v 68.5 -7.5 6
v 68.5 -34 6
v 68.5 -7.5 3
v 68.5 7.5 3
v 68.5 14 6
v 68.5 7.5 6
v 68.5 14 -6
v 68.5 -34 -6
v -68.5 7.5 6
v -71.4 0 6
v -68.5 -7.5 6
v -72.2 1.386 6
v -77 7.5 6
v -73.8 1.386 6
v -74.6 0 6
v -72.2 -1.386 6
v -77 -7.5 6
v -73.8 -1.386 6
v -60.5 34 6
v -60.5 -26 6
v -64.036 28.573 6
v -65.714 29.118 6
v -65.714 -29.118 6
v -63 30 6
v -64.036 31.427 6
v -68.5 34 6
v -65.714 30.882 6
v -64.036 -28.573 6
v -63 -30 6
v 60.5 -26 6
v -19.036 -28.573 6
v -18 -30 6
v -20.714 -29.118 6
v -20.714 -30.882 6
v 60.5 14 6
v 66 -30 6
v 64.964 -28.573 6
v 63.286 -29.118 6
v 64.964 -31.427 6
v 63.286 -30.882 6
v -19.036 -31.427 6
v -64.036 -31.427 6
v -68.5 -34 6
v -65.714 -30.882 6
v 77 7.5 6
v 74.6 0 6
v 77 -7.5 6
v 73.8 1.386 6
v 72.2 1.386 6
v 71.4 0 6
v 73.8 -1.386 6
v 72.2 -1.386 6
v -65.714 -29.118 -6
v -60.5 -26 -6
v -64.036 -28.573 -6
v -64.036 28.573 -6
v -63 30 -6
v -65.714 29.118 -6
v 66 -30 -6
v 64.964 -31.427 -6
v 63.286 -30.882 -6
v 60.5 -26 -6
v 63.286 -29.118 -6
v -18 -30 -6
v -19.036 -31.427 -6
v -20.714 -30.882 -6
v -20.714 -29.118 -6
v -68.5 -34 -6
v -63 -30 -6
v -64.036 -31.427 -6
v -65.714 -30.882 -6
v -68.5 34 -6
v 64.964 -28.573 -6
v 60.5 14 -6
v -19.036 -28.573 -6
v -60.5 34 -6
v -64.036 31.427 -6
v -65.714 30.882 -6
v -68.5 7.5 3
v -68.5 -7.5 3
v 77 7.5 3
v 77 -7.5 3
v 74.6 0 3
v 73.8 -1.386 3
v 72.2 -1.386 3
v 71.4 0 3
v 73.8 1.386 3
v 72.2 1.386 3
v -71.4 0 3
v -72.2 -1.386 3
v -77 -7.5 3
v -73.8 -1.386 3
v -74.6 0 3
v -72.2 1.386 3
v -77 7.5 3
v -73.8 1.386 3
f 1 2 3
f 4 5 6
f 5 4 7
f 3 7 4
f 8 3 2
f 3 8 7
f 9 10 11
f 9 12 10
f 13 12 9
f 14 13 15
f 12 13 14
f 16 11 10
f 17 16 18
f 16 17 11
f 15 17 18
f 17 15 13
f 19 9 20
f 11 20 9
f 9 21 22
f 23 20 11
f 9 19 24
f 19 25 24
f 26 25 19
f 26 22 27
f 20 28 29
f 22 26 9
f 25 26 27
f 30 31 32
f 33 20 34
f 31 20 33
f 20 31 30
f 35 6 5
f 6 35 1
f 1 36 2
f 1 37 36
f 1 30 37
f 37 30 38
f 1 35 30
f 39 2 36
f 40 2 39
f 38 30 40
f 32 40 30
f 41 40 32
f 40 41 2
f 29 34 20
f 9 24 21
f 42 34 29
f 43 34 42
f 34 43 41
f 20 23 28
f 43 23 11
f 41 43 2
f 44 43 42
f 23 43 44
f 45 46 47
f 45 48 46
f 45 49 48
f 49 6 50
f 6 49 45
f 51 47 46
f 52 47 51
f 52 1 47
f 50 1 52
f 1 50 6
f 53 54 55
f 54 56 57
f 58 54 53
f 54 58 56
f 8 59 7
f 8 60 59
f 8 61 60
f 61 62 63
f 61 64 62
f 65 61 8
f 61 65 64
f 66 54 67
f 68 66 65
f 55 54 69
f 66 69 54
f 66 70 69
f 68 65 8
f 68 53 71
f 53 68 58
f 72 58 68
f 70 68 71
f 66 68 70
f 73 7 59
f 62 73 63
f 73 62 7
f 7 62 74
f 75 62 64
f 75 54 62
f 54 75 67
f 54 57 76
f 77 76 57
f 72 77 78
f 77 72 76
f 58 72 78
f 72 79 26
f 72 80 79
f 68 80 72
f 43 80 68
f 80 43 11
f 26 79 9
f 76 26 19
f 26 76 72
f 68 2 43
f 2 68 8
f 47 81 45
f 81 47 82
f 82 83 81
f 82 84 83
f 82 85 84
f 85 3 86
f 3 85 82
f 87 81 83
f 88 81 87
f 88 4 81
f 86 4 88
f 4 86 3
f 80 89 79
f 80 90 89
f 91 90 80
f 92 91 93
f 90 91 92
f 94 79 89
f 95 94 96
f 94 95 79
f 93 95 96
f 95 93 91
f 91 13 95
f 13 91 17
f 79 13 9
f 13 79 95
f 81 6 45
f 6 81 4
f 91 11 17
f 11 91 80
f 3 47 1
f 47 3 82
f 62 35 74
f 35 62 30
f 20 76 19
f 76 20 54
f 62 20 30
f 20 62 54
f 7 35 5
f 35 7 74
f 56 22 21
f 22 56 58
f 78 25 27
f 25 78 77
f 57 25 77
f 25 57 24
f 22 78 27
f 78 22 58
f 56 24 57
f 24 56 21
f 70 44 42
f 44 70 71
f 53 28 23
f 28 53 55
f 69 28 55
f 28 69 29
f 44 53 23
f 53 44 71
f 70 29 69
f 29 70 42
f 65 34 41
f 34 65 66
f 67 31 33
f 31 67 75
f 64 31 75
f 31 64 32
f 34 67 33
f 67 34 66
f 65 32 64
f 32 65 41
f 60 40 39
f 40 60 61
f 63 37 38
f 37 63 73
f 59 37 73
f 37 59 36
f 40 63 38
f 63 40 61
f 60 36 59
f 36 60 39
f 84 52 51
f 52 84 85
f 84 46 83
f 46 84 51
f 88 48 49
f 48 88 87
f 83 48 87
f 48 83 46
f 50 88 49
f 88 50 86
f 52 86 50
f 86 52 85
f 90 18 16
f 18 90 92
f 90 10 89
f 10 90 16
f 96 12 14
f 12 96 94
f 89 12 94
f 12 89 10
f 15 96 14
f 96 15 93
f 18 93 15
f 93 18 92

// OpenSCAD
// Corsair iCue Commander Module
// - base
// - cap


// TODO
// - countersink the m3 heads!!
// 

plate_z = 3;

rail_x = 8;
rail_y = 8;
rail_z = 12;

// mounting tabs
tab_y = 15;
tab_z = 3;
tab_ext = 20;

// dimension + tolerance
iCue_x = 133 + 1;
iCue_y = 68 + 1;
iCue_z = 15.5 + 0.5;

// x_offset = adjustment in X direction from 3 hole centerline
x_offet = -20;

// mount base to the case
m3_pilot = 2.2;
m3_dia = 3;
m3_head_dia = 6;
m3_head_depth = 3;
m3_length = 12;

// mount iCue to base
m4_dia = 4;
m4_pilot = 3.2;


// screws 
s1_x = 0;
s1_y = 0;
s2_x = 0;
s2_y = -60;
s3_x = 45;
s3_y = -60;
s4_x = 129;
s4_y = -60;

difference () {
    {
        union () {
            translate([0,0,0])
            cube([(s4_x - s2_x) + rail_x,
                (s1_y - s2_y) + rail_y,
                rail_z], center = true);
            
            // mounting tabs
            translate([0,0, rail_z/2 - tab_z/2])
            cube([(iCue_x + tab_ext ),tab_y,tab_z], center = true);

        }
    }
    {
        cube([(s4_x - s2_x) - rail_x,
        (s1_y - s2_y) - rail_y,
        rail_z], center = true);
        
        translate([0, 16,0])
        cube([(s4_x - s2_x) - rail_x,
            (s1_y - s2_y) - rail_y,
            rail_z], center = true);
        
        translate([rail_x, 40,0])
        cube([(s4_x - s2_x) - rail_x,
            (s1_y - s2_y) - rail_y,
            rail_z], center = true);
        
        // screw holes
        // - thru
        translate([-(s4_x - s1_x)/2, (s1_y - s2_y)/2, 0])
        cylinder(r = m3_dia/2, h = rail_z, center = true);
        
        translate([-(s4_x - s1_x)/2, -(s1_y - s2_y)/2, 0])
        cylinder(r = m3_dia/2, h = rail_z, center = true);
        
        translate([-((s4_x - s1_x)/2 - s3_x) , -(s1_y - s2_y)/2, 0])
        #cylinder(r = m3_dia/2, h = rail_z, center = true);

        translate([-((s4_x - s1_x)/2 - s4_x), -(s1_y - s2_y)/2, 0])
        cylinder(r = m3_dia/2, h = rail_z, center = true);    
    

        // mounting tab holes
        translate([(iCue_x + tab_ext)/2 - 4,0, rail_z/2 - tab_z/2])
        cylinder(r = m4_pilot/2, h = tab_z, center = true);
        
        translate([-((iCue_x + tab_ext)/2 - 4),0, rail_z/2 - tab_z/2])
        cylinder(r = m4_pilot/2, h = tab_z, center = true);
    }
}
